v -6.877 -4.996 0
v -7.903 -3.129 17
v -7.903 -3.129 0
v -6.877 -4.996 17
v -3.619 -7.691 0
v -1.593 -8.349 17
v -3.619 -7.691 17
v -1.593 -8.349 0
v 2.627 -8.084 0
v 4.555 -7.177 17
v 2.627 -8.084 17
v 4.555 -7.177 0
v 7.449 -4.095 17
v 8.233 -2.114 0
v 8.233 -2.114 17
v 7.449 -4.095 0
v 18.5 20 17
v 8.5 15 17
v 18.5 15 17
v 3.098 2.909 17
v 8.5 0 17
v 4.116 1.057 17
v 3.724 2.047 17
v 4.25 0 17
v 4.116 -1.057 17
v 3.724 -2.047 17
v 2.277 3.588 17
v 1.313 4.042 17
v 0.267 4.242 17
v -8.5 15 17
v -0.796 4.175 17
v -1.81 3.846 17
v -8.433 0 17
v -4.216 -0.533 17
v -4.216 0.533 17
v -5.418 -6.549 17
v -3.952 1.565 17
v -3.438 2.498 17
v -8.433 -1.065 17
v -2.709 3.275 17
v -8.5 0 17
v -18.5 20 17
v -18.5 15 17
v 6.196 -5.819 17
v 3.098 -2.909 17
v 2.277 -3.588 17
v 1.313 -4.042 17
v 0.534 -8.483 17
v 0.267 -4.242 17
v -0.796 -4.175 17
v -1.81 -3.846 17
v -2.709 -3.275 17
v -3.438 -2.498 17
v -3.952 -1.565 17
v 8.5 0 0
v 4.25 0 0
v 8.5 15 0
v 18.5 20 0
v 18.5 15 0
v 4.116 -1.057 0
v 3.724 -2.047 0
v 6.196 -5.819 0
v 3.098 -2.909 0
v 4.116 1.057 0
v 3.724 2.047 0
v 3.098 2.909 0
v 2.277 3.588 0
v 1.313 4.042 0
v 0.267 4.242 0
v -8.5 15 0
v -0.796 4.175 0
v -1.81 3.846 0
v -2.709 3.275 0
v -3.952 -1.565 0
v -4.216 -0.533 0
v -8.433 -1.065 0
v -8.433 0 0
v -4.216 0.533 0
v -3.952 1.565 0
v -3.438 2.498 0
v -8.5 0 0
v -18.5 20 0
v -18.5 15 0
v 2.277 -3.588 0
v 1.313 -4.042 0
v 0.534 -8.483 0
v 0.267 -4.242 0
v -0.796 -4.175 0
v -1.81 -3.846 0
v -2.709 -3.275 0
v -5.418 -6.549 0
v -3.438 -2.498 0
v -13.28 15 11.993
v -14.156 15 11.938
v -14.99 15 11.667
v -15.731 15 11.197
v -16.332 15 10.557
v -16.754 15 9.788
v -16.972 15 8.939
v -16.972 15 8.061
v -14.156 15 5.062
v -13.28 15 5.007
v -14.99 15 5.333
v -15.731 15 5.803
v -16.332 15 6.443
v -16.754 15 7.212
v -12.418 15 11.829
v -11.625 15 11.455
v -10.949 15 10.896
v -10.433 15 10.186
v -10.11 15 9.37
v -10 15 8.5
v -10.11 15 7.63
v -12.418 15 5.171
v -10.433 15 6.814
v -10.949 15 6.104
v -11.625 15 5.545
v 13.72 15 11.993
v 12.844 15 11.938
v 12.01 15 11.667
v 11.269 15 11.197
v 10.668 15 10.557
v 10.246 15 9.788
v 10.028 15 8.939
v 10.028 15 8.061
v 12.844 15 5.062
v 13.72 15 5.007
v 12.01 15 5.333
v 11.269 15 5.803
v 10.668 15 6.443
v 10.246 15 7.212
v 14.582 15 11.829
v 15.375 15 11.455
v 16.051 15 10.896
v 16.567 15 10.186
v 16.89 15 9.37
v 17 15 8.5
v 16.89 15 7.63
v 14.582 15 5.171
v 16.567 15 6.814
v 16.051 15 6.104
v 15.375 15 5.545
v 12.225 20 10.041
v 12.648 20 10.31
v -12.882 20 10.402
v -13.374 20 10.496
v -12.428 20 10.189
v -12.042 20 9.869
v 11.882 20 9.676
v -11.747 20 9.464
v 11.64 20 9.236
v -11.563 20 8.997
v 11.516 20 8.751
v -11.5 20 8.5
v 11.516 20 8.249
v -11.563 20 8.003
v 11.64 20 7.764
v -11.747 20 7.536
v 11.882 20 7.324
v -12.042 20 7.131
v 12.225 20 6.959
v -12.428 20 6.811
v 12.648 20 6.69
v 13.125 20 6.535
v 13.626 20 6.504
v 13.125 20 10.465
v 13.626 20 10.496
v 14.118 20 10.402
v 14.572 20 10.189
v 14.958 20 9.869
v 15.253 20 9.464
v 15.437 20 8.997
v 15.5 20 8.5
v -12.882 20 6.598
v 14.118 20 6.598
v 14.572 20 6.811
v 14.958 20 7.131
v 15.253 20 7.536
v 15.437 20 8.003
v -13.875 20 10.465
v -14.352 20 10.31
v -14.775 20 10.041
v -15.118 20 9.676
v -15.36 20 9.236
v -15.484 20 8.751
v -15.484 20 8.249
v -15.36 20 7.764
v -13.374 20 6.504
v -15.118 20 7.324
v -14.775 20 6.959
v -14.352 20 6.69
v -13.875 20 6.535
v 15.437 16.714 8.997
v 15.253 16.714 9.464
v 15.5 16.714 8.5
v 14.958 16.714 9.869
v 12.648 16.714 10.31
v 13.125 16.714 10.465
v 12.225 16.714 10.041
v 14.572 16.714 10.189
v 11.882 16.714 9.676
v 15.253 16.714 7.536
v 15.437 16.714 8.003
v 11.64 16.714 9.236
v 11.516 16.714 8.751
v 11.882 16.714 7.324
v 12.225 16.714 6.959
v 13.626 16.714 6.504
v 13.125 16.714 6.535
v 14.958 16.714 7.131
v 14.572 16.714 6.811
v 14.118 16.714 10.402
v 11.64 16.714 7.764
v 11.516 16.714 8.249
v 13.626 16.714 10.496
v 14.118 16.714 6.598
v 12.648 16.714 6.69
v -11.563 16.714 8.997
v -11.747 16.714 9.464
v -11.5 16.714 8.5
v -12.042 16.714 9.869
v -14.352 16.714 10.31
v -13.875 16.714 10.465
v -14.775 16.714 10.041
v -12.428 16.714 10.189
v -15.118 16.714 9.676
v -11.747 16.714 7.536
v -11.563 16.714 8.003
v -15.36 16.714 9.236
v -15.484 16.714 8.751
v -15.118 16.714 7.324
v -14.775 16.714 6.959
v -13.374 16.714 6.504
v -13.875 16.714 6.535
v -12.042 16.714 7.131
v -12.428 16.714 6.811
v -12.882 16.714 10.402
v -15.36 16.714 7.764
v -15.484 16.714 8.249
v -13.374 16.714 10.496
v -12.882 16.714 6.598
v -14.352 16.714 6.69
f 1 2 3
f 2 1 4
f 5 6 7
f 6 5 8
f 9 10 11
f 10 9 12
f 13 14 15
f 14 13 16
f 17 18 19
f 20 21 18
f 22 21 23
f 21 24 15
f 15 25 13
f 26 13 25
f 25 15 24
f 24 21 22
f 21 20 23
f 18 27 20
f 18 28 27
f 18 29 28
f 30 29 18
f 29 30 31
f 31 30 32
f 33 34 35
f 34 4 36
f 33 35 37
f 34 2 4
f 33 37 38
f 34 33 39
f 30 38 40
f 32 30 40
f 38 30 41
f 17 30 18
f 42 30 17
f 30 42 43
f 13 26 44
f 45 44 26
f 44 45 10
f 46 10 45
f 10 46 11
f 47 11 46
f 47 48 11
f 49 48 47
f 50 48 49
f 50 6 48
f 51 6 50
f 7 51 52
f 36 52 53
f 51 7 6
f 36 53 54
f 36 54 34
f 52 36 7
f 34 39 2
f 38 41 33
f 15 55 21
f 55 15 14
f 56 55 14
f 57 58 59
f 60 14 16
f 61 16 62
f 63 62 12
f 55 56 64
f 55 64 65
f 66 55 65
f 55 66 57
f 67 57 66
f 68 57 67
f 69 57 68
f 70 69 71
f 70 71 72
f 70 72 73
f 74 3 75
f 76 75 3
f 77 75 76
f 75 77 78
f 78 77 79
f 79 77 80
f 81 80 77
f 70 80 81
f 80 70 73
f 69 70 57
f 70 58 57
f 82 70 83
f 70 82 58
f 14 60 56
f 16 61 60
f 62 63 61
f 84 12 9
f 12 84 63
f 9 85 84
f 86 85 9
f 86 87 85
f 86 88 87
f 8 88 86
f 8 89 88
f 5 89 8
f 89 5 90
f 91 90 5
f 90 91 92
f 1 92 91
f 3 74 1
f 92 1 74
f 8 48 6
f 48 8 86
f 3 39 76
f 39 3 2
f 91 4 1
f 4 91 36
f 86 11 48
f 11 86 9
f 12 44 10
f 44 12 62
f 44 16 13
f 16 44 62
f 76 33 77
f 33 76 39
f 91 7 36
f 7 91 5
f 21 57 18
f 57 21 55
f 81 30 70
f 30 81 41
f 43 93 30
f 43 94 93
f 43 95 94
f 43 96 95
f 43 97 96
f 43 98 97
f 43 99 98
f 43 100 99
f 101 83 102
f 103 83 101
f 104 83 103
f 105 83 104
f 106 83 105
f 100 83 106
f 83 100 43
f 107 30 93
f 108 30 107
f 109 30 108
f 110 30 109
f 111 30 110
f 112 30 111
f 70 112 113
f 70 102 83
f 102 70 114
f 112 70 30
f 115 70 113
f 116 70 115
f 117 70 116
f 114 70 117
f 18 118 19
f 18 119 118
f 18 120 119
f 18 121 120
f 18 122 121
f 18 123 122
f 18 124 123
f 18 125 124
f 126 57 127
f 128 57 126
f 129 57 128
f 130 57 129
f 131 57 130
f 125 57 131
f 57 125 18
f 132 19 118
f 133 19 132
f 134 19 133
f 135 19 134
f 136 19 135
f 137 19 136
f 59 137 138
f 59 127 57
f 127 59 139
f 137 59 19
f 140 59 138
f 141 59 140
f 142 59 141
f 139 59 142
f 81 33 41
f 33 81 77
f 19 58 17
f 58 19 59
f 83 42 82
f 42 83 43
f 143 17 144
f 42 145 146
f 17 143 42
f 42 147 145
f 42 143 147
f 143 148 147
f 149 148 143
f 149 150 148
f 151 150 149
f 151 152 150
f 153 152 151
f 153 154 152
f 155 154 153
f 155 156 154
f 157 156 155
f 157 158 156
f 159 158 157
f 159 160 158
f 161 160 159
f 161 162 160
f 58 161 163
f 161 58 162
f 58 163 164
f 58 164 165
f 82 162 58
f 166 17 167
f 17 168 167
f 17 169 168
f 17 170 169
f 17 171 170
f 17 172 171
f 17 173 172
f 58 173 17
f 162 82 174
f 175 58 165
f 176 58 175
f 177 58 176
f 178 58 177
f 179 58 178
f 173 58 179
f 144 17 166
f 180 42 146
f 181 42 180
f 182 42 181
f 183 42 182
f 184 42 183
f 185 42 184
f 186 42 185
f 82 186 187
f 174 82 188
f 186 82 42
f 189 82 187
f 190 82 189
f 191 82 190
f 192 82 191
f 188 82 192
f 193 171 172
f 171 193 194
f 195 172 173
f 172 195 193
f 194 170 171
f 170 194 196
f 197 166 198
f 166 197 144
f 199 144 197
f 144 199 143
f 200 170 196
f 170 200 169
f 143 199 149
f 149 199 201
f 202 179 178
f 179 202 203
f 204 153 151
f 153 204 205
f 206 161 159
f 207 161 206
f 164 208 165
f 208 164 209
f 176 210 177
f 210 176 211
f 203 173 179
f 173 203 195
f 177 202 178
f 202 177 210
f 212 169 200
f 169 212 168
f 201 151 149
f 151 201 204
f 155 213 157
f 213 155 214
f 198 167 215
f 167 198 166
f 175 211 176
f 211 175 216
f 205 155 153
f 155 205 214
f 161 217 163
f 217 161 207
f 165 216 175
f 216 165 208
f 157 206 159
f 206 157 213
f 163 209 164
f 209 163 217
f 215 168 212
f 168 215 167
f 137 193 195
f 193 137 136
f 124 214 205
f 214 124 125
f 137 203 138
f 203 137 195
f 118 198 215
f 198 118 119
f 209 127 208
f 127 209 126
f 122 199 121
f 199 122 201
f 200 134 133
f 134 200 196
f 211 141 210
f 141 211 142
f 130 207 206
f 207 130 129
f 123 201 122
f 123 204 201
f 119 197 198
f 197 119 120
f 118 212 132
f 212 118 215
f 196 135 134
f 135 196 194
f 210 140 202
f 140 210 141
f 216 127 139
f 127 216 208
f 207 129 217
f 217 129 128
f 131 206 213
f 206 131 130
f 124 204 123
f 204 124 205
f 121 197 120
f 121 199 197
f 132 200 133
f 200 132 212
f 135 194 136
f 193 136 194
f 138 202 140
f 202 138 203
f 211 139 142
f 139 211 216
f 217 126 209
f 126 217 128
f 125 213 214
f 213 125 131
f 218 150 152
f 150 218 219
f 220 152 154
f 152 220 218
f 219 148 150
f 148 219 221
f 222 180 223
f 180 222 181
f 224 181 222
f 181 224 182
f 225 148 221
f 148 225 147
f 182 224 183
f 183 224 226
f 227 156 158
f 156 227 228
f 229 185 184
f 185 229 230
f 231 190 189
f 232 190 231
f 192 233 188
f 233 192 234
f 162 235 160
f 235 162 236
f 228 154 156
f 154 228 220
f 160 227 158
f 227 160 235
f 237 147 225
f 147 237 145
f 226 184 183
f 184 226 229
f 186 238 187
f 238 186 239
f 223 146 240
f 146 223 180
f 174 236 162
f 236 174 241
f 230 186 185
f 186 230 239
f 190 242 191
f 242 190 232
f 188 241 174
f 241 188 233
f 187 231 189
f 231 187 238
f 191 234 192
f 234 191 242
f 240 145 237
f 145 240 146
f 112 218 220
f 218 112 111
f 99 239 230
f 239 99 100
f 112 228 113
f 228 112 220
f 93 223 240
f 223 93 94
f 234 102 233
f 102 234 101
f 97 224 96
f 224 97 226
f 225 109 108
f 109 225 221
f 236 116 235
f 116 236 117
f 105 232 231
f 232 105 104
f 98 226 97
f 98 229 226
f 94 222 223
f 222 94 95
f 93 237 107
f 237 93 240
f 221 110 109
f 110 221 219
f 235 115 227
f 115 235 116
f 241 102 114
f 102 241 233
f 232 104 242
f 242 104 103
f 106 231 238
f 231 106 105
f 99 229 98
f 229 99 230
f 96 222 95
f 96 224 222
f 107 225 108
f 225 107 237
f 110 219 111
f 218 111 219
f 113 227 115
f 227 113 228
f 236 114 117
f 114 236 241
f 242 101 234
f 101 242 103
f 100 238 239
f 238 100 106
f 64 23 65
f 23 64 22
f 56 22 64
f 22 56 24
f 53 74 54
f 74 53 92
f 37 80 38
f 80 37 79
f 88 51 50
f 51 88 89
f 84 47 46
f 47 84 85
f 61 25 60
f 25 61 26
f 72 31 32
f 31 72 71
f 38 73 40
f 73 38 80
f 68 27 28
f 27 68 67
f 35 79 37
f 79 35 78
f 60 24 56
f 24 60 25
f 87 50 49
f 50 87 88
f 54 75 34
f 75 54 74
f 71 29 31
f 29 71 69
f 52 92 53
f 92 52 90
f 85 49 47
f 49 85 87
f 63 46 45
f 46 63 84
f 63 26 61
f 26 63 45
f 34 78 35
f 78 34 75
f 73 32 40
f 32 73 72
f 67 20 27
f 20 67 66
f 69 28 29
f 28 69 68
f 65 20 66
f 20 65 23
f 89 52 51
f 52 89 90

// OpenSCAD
$fn = 25;

stud_clear_dia = 8.5;
washer_dia = 17;
thk = washer_dia;
flange_width = 10;
base_width = 17+flange_width*2;
base_hole_centres = base_width - flange_width;
base_depth = 5;
screw_hole_dia = 4;
csk_depth = 4;
csk_dia = 7;
centre_height = 20;

module csk_screw_hole(screw_dia, screw_depth, csk_dia, csk_depth)
{
    translate([0,0,-screw_depth])
        cylinder(d=screw_dia,h=screw_depth);
    
    translate([0,0,-csk_depth])
//        cylinder(d1=screw_dia,d2=csk_dia,csk_depth);
        cylinder(d1=0,d2=csk_dia,csk_depth);
}

//base solid
difference()
{
    union()
    {
        //vertical cylinder
        cylinder(d=washer_dia,h=thk);
        
        //middle block
        translate([-washer_dia/2,0,0])
            cube([washer_dia,centre_height-base_depth,washer_dia]);
        
        //base block
        translate([-base_width/2,centre_height-base_depth,0])
            cube([base_width,base_depth,thk]);
       
    }

//stud bar hole
cylinder(d=stud_clear_dia,h=thk);
    
        //screw hole and countersink
    rotate([90,0,0])
    {
    translate([base_hole_centres/2,thk/2,-(centre_height-base_depth)])
        csk_screw_hole(screw_hole_dia,base_depth,csk_dia,csk_depth);
    translate([-base_hole_centres/2,thk/2,-(centre_height-base_depth)])
        csk_screw_hole(screw_hole_dia,base_depth,csk_dia,csk_depth);
    }
    
}

    
